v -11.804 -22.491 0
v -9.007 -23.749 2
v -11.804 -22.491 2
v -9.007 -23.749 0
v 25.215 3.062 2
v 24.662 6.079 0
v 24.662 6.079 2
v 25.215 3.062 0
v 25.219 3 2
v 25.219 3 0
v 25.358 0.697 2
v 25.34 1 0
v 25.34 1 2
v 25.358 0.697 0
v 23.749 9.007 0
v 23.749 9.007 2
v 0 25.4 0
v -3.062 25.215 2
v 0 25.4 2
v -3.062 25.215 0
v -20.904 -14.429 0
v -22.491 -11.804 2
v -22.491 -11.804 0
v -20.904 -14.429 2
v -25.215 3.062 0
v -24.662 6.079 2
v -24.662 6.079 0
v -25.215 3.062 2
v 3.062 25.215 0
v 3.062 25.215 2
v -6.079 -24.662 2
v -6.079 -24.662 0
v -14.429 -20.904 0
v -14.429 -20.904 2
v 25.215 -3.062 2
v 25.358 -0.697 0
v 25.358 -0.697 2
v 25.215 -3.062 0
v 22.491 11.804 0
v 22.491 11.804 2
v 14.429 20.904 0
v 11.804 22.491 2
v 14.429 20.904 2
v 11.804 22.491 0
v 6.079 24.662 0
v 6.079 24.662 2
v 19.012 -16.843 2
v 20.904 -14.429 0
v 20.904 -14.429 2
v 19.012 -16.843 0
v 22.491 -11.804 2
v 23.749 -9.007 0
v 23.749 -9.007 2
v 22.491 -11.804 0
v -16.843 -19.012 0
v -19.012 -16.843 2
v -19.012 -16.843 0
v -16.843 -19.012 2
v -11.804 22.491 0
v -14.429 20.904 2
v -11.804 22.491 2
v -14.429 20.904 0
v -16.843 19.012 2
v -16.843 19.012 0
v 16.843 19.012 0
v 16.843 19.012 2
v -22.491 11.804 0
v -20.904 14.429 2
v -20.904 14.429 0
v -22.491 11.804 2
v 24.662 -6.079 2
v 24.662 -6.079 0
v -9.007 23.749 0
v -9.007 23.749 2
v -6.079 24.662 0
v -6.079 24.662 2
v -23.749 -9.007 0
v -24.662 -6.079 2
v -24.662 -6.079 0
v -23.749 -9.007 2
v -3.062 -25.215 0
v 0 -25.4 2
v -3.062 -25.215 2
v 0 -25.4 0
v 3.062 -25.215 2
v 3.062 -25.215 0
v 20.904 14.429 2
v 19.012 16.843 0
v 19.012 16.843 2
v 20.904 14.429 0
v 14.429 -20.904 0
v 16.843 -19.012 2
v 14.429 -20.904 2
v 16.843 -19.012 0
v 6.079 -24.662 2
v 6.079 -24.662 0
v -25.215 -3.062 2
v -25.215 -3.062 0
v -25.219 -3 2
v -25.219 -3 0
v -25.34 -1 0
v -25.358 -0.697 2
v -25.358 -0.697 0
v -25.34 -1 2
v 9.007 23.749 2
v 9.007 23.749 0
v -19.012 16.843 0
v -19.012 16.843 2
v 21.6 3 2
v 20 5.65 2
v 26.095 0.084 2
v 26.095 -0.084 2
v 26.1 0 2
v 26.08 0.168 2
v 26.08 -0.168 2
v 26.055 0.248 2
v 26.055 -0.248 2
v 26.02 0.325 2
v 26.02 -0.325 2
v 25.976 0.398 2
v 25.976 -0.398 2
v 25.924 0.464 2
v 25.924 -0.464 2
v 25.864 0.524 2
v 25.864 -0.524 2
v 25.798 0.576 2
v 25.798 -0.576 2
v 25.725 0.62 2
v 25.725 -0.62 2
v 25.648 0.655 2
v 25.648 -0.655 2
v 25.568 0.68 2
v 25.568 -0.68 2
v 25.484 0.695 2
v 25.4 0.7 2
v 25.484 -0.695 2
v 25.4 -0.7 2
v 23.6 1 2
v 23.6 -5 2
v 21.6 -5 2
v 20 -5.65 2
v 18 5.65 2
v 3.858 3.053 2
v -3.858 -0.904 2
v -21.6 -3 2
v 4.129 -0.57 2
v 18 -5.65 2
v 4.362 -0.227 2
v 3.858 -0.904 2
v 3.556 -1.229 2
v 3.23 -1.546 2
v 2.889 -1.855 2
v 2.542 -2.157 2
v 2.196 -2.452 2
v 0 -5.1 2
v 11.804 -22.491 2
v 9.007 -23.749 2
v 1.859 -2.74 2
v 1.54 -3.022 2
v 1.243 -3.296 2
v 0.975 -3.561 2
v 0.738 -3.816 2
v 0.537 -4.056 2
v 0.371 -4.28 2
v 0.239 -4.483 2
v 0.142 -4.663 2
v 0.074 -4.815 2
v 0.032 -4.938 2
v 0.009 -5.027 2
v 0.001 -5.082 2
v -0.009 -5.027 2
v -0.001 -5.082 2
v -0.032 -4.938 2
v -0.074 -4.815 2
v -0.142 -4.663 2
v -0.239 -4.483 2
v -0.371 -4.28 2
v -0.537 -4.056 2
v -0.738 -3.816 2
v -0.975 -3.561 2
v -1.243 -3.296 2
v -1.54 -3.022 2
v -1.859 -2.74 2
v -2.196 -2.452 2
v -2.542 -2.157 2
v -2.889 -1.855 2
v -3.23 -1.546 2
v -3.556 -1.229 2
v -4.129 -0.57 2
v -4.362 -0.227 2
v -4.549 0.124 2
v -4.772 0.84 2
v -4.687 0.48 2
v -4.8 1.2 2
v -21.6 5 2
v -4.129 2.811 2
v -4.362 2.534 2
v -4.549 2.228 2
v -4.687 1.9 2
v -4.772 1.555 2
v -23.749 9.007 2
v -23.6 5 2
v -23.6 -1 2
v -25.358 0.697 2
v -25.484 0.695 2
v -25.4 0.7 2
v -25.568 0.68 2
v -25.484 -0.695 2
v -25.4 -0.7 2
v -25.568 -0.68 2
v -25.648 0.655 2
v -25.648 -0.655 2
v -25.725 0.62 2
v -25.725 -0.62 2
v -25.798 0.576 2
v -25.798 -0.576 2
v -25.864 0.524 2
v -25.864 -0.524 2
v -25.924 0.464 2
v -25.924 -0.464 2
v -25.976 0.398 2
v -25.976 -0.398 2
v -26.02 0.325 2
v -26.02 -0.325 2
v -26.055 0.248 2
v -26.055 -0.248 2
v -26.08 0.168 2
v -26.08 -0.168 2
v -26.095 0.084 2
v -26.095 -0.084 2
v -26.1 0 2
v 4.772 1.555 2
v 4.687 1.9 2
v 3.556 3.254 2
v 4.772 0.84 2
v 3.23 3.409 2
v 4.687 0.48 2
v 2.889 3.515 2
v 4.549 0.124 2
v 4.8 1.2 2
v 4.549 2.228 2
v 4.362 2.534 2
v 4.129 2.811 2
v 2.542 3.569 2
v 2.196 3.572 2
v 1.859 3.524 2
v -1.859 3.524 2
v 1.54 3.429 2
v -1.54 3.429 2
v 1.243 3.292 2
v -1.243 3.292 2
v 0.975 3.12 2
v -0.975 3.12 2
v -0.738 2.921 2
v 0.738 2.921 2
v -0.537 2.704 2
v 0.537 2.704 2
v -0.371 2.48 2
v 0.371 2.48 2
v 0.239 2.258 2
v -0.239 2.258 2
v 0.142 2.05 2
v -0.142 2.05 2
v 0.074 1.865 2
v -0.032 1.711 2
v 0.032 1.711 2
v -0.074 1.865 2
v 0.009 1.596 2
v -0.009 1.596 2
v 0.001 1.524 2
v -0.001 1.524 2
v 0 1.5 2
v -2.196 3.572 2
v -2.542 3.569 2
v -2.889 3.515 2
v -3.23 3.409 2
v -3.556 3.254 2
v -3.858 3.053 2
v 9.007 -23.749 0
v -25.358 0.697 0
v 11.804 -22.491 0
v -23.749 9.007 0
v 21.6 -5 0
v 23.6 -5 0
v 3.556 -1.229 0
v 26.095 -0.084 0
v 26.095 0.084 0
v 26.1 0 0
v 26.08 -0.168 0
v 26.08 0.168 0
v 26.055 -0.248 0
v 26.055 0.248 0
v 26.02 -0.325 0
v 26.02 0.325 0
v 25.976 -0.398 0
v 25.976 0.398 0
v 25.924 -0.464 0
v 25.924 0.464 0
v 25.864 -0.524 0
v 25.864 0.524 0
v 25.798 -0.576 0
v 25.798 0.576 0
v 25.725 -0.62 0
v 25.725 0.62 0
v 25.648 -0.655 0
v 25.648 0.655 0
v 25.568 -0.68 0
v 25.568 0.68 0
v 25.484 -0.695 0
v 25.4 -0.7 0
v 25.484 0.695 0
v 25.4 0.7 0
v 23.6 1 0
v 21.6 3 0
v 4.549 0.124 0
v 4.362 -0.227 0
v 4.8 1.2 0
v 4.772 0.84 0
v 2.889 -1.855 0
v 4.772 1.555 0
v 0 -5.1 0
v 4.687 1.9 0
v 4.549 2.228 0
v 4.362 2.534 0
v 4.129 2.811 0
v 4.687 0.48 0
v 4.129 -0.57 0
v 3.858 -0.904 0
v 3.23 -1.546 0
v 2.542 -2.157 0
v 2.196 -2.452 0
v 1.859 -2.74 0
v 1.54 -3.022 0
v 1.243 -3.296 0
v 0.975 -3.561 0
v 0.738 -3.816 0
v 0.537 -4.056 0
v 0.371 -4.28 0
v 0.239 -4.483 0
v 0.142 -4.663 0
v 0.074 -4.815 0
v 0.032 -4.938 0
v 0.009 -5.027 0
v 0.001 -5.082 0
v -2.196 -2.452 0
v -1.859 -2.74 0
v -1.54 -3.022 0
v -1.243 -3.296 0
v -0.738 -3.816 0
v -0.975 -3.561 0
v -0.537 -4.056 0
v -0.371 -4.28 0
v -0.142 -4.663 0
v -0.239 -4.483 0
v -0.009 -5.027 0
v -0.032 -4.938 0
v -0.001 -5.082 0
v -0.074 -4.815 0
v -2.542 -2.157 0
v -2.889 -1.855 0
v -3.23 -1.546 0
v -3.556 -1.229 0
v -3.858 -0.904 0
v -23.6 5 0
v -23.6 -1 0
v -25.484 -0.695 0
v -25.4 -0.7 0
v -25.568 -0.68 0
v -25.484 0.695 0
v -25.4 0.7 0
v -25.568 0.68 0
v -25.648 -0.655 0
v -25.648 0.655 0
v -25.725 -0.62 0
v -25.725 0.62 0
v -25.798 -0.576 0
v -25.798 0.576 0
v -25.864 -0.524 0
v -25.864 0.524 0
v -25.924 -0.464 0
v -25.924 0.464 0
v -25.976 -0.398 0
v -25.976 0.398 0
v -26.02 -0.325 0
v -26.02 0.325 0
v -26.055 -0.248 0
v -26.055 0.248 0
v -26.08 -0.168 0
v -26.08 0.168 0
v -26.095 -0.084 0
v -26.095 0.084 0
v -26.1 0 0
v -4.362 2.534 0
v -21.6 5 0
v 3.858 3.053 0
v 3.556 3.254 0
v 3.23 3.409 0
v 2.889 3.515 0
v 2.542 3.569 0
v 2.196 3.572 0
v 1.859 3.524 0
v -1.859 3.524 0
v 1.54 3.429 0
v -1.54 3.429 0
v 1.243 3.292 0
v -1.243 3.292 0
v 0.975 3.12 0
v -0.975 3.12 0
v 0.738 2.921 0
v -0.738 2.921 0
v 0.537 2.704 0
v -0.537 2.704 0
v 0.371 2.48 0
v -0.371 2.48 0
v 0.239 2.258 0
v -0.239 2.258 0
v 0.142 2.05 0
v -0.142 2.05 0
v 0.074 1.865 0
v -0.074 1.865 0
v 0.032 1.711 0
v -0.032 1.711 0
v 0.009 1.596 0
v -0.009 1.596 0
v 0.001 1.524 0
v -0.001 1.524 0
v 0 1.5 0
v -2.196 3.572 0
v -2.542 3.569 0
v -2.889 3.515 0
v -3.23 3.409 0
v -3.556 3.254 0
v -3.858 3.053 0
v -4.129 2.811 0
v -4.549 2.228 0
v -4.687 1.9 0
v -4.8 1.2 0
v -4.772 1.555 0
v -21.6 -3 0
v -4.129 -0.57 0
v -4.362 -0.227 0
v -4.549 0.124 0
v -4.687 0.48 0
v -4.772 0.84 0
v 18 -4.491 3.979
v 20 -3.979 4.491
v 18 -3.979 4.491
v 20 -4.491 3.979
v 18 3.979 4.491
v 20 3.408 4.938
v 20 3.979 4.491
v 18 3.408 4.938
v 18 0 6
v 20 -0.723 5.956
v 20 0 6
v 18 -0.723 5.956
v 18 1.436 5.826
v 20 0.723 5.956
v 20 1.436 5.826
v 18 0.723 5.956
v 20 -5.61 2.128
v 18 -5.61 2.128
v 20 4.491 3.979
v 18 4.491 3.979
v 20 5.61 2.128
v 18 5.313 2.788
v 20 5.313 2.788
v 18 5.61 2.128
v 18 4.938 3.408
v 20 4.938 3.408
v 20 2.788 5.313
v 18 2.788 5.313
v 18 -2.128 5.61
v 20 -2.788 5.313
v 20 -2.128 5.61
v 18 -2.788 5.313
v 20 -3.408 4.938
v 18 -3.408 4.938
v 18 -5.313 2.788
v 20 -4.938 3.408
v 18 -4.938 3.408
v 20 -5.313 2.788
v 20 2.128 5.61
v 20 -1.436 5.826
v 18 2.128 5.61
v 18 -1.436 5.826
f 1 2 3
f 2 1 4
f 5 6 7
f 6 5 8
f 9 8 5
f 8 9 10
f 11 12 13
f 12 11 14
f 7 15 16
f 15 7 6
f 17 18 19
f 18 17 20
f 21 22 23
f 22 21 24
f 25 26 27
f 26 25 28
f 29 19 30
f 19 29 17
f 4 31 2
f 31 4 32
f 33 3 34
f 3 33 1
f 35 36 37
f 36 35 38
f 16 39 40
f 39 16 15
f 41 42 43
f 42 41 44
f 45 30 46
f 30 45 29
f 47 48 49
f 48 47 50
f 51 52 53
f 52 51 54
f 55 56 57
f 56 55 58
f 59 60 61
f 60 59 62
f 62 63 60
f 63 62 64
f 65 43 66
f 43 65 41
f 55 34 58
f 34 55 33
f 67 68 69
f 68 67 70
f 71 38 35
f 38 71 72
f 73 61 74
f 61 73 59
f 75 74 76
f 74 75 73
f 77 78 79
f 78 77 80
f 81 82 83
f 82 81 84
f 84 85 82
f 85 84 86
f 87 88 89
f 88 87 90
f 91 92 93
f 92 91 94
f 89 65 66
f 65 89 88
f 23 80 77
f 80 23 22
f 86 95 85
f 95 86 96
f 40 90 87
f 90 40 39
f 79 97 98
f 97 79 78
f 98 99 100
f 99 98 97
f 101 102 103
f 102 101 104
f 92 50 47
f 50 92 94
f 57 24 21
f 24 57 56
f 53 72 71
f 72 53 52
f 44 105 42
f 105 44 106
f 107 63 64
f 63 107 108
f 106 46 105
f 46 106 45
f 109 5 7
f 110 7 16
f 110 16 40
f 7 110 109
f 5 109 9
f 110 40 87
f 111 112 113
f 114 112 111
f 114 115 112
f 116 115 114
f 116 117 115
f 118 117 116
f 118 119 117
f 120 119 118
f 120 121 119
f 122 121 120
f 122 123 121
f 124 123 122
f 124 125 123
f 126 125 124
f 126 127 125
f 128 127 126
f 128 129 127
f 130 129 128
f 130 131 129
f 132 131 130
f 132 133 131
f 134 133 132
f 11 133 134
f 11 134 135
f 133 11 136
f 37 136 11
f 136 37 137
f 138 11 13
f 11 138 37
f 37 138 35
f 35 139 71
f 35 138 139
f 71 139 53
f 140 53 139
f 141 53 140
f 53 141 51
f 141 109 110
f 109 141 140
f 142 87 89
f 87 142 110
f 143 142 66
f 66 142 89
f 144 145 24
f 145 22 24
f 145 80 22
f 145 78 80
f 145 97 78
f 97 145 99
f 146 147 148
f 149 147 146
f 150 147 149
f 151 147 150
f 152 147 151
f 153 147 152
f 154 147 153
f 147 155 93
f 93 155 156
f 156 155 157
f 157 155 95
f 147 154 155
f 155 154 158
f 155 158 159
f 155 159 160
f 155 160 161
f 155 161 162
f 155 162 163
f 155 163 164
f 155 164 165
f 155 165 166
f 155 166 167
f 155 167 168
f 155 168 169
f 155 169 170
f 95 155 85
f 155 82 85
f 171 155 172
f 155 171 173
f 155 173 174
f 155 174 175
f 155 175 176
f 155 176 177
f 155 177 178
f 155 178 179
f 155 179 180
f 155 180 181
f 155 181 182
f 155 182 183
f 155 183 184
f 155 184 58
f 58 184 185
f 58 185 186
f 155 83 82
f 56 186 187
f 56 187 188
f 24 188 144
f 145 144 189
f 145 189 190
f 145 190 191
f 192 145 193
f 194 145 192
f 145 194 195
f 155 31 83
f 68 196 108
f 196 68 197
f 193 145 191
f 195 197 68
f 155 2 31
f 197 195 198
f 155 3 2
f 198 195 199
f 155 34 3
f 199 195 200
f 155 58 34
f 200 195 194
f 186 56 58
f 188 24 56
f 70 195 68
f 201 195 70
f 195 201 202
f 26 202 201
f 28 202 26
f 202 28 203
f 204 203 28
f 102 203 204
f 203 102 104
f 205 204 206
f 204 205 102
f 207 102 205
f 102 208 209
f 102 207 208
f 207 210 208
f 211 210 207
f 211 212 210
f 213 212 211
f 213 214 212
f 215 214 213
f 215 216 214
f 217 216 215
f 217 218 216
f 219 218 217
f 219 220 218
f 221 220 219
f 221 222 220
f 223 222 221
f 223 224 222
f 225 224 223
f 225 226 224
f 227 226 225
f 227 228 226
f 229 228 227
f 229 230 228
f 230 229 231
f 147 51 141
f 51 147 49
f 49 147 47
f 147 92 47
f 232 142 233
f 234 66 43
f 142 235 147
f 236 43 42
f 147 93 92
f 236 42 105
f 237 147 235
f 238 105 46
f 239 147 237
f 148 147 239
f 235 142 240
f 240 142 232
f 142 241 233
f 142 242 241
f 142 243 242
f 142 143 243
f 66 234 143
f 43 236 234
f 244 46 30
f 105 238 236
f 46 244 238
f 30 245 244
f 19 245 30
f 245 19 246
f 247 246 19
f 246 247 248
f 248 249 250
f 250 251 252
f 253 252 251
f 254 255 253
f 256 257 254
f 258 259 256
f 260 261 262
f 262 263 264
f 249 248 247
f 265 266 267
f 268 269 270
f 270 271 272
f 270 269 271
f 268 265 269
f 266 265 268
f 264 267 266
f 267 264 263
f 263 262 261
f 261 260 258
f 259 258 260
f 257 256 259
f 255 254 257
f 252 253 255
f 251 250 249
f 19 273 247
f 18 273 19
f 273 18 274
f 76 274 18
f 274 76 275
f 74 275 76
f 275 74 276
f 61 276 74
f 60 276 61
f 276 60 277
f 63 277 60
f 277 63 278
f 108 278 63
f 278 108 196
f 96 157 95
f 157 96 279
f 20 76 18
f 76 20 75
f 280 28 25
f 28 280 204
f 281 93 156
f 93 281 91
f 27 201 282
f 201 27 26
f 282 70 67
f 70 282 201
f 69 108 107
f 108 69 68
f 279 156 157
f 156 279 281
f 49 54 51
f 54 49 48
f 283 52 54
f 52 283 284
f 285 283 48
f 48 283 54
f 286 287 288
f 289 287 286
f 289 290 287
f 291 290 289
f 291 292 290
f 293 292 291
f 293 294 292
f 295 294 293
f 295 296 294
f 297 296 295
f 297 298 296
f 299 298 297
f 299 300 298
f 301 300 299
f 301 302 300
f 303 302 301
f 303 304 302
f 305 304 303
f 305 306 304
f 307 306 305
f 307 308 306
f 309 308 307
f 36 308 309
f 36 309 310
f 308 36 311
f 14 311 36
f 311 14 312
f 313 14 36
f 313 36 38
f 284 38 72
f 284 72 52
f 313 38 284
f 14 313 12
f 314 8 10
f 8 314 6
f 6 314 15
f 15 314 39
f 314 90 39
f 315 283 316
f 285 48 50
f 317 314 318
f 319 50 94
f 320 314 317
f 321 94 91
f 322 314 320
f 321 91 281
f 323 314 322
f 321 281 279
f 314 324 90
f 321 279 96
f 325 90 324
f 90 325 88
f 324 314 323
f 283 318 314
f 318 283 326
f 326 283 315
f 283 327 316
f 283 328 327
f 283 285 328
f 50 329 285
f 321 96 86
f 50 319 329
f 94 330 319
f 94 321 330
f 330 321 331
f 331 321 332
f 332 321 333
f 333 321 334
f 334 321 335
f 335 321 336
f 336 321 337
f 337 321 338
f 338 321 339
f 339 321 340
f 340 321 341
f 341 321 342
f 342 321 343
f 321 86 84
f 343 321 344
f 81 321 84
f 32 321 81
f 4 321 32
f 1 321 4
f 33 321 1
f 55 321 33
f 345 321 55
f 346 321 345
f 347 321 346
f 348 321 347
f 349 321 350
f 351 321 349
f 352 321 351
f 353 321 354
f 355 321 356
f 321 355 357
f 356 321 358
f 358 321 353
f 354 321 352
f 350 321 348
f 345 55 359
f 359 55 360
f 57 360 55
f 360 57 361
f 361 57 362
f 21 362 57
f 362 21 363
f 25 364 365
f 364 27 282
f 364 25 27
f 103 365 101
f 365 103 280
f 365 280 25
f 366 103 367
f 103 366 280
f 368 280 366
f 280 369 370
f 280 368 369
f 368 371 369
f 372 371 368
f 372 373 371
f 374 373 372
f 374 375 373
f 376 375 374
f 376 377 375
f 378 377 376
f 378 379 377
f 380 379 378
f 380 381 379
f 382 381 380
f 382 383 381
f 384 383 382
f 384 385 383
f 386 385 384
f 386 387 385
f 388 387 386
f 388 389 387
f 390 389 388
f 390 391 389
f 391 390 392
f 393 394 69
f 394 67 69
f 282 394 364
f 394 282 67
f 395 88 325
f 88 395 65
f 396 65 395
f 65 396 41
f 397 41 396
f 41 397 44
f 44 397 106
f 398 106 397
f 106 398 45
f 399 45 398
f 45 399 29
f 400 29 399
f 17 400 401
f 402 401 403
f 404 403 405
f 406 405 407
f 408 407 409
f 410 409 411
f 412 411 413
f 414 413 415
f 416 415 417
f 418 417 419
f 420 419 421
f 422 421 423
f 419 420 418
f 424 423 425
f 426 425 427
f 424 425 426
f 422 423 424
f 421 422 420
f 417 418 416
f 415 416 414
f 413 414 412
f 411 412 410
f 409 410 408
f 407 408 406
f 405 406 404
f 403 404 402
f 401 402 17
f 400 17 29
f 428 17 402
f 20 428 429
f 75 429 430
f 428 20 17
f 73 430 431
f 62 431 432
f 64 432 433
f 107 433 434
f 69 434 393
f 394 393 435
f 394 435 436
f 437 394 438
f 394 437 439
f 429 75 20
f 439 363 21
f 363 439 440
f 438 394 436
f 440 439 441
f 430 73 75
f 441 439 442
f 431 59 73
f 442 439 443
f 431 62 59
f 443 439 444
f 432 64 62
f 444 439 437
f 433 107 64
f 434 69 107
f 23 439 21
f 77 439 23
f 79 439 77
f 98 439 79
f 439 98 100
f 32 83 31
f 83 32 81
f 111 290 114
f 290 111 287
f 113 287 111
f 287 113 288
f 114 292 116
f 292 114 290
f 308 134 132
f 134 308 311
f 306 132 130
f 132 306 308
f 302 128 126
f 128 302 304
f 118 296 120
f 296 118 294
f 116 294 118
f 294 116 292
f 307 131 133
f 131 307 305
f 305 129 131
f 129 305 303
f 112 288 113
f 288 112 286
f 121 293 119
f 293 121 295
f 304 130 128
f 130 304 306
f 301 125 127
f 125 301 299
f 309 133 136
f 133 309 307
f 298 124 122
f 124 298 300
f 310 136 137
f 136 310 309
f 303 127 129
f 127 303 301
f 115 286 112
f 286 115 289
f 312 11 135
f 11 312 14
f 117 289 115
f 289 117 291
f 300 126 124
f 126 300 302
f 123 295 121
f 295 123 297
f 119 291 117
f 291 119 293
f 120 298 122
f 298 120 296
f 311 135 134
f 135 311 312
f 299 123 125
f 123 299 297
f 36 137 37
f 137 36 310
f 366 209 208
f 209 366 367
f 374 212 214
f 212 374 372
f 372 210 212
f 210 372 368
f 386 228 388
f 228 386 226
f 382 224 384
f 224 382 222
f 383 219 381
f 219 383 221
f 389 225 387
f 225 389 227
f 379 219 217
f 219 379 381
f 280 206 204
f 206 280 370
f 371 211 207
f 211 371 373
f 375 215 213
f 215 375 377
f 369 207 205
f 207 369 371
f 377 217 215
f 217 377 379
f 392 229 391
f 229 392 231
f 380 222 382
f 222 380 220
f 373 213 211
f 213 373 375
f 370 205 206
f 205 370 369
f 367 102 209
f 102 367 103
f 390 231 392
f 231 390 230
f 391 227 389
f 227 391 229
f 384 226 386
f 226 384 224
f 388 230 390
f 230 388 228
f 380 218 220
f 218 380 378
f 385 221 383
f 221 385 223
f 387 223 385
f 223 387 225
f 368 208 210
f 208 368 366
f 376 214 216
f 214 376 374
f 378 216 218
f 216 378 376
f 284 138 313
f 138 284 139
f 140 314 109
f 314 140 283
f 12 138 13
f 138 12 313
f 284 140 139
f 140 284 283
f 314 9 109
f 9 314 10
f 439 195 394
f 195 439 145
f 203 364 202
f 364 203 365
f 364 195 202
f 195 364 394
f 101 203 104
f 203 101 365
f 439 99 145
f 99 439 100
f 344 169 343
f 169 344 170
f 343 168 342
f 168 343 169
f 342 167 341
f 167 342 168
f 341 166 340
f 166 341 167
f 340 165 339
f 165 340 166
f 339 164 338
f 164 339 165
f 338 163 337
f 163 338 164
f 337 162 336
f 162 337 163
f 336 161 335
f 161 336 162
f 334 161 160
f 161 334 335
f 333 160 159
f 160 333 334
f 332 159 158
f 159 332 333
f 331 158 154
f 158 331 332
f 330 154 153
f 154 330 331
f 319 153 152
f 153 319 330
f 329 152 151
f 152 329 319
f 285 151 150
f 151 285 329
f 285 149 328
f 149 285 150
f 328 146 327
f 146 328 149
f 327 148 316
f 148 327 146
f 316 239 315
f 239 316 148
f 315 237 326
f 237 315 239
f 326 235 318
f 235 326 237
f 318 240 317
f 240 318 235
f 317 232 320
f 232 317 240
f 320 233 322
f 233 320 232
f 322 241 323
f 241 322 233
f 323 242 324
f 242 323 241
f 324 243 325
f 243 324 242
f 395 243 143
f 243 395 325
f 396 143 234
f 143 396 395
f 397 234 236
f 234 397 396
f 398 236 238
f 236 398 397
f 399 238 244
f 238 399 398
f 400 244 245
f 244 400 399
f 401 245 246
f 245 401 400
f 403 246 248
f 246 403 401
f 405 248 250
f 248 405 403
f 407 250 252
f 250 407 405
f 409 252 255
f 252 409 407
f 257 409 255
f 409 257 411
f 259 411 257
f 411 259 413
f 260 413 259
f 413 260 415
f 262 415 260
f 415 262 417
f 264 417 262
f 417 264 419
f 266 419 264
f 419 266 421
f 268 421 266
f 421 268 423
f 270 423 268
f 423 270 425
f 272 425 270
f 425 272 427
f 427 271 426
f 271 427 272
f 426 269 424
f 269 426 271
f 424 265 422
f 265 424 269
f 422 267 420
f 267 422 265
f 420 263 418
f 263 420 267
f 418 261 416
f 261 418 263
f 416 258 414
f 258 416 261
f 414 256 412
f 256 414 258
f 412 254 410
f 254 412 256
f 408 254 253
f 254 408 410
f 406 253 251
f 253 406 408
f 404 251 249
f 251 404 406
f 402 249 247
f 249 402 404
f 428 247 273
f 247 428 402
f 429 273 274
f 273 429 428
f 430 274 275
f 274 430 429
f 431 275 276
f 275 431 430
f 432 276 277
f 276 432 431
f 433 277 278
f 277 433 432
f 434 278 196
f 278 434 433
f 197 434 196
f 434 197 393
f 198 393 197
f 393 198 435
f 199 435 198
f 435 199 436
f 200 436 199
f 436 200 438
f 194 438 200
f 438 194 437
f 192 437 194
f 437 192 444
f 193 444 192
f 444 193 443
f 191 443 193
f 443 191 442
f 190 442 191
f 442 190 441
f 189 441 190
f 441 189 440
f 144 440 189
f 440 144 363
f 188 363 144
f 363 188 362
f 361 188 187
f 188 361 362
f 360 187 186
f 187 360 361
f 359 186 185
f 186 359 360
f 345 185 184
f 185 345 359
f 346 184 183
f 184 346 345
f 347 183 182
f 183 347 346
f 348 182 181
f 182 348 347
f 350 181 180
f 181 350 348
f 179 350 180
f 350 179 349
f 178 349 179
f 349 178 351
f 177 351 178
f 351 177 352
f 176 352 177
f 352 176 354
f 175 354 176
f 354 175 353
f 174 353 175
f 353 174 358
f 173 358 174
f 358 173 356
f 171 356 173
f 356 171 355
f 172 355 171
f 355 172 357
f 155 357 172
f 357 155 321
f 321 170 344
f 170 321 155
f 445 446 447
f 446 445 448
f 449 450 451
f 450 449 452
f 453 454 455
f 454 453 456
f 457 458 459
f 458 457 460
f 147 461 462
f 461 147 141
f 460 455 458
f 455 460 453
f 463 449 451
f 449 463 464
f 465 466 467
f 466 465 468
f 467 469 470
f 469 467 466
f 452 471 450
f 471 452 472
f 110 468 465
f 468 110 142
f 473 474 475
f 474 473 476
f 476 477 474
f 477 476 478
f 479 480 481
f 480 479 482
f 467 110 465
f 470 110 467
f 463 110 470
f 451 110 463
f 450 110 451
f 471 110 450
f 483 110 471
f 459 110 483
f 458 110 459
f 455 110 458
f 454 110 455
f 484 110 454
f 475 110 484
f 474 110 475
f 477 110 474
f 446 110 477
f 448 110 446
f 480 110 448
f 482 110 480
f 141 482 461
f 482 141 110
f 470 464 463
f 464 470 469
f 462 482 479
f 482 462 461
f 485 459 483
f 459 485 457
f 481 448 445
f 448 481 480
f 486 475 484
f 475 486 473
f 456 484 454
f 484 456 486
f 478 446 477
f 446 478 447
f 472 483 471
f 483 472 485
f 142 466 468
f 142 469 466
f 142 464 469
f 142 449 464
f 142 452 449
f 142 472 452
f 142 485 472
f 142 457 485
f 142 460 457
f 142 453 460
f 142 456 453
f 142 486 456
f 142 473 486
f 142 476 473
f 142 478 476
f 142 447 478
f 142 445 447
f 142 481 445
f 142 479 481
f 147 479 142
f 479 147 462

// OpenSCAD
// file: csodaszarvas.scad
module csodaszarvas() {
    scale([0.001, 0.001])
    translate([-300, -475])
    polygon([
        [ 606, 191.3 ],
        [ 607.2, 215.2 ],
        [ 607.4, 221.1 ],
        [ 607.1, 231.2 ],
        [ 606, 239.1 ],
        [ 603.8, 245.1 ],
        [ 602.3, 247.6 ],
        [ 600, 251.1 ],
        [ 596.8, 257.2 ],
        [ 596.4, 259.1 ],
        [ 596.9, 259.5 ],
        [ 601.1, 259 ],
        [ 613.4, 255.6 ],
        [ 636.3, 247.4 ],
        [ 660.1, 237.7 ],
        [ 670, 232.9 ],
        [ 678.3, 228.4 ],
        [ 697.9, 216.3 ],
        [ 706.8, 210.2 ],
        [ 714.5, 204.8 ],
        [ 726.6, 197.4 ],
        [ 729.3, 196.3 ],
        [ 729.9, 196.4 ],
        [ 730.5, 197.1 ],
        [ 730.3, 199.4 ],
        [ 726.3, 207.6 ],
        [ 715.6, 223.1 ],
        [ 701.7, 239.5 ],
        [ 694.5, 246.6 ],
        [ 689.9, 250.6 ],
        [ 679.4, 258.5 ],
        [ 667.4, 266.1 ],
        [ 654.1, 273.4 ],
        [ 639.6, 280.4 ],
        [ 623.9, 287 ],
        [ 598.7, 296.1 ],
        [ 562.4, 306.6 ],
        [ 524.1, 314.9 ],
        [ 484.7, 320.7 ],
        [ 455, 323.2 ],
        [ 435.5, 324 ],
        [ 425.8, 324.1 ],
        [ 416, 324 ],
        [ 395.4, 322.9 ],
        [ 374, 320.8 ],
        [ 352.2, 317.7 ],
        [ 330.5, 313.8 ],
        [ 309, 309 ],
        [ 288.4, 303.5 ],
        [ 268.9, 297.4 ],
        [ 259.7, 294.1 ],
        [ 258.7, 293.9 ],
        [ 258.3, 295.1 ],
        [ 261.5, 300.6 ],
        [ 266, 306.1 ],
        [ 270.9, 311.9 ],
        [ 277.6, 320.9 ],
        [ 278.6, 322.9 ],
        [ 278.1, 323.3 ],
        [ 274.8, 323.9 ],
        [ 265, 323.8 ],
        [ 256.3, 323.1 ],
        [ 234, 321 ],
        [ 209.8, 352 ],
        [ 201, 363.5 ],
        [ 191.8, 376.7 ],
        [ 188.2, 383.1 ],
        [ 186.5, 387.8 ],
        [ 186.7, 391 ],
        [ 188.7, 392.9 ],
        [ 192.4, 393.8 ],
        [ 194.9, 393.9 ],
        [ 203.2, 394.6 ],
        [ 230.6, 399.2 ],
        [ 265.2, 406.7 ],
        [ 298.5, 415.3 ],
        [ 312, 419.4 ],
        [ 330, 425.6 ],
        [ 387.5, 447.1 ],
        [ 420, 459.6 ],
        [ 453.1, 472.2 ],
        [ 514.3, 494.1 ],
        [ 535, 500.7 ],
        [ 548.7, 504.8 ],
        [ 562.8, 510.1 ],
        [ 568, 513.2 ],
        [ 569.7, 515.6 ],
        [ 569.9, 517.1 ],
        [ 568.7, 519.6 ],
        [ 564.6, 523.3 ],
        [ 557.6, 527.5 ],
        [ 553.1, 529.9 ],
        [ 537.9, 537.6 ],
        [ 564.6, 567.5 ],
        [ 573.4, 577.4 ],
        [ 589.8, 596.7 ],
        [ 621.9, 637.5 ],
        [ 656.4, 682.6 ],
        [ 665.2, 694.8 ],
        [ 682.8, 722.1 ],
        [ 699.8, 752 ],
        [ 715.4, 783.1 ],
        [ 729, 813.8 ],
        [ 739.8, 842.4 ],
        [ 747.3, 867.5 ],
        [ 750.2, 883 ],
        [ 750.7, 891.5 ],
        [ 750.5, 895.1 ],
        [ 749.2, 907.4 ],
        [ 743.6, 895.7 ],
        [ 739.7, 888 ],
        [ 729.2, 869.1 ],
        [ 708.5, 834.7 ],
        [ 676.1, 784.3 ],
        [ 644.4, 738.8 ],
        [ 631.1, 721.2 ],
        [ 620.8, 709 ],
        [ 595.5, 682.1 ],
        [ 566.8, 654.9 ],
        [ 538.7, 630.9 ],
        [ 525.9, 621.3 ],
        [ 517.2, 615.2 ],
        [ 499.5, 603.6 ],
        [ 481.4, 592.7 ],
        [ 463.1, 582.6 ],
        [ 444.4, 573.3 ],
        [ 425.4, 564.7 ],
        [ 406.1, 557 ],
        [ 386.5, 550 ],
        [ 366.6, 543.7 ],
        [ 346.4, 538.3 ],
        [ 325.9, 533.6 ],
        [ 305.1, 529.7 ],
        [ 284, 526.6 ],
        [ 262.6, 524.2 ],
        [ 240.9, 522.7 ],
        [ 219, 521.9 ],
        [ 207.9, 521.8 ],
        [ 186.9, 522 ],
        [ 149.8, 523.2 ],
        [ 121.8, 525.3 ],
        [ 108.8, 527.3 ],
        [ 104.7, 528.9 ],
        [ 104.2, 529.7 ],
        [ 105.5, 530.7 ],
        [ 115, 534.8 ],
        [ 142.6, 545 ],
        [ 167, 553.3 ],
        [ 192.9, 562.3 ],
        [ 227.5, 575.7 ],
        [ 244, 583 ],
        [ 249.1, 585.7 ],
        [ 252.7, 588 ],
        [ 260.2, 593.8 ],
        [ 271.4, 604.2 ],
        [ 281, 615.1 ],
        [ 285.9, 621.8 ],
        [ 288.9, 627.4 ],
        [ 289.8, 630.6 ],
        [ 289.6, 632.1 ],
        [ 289.2, 632.6 ],
        [ 288, 632.8 ],
        [ 281.5, 631.3 ],
        [ 262.8, 625.3 ],
        [ 202.8, 603.2 ],
        [ 105.8, 564.9 ],
        [ 47, 540 ],
        [ 29.3, 531.6 ],
        [ 23.6, 528.3 ],
        [ 22.8, 527.3 ],
        [ 23.1, 524.9 ],
        [ 24.9, 519.9 ],
        [ 28.4, 514.7 ],
        [ 33.4, 509.6 ],
        [ 39.7, 504.6 ],
        [ 47.2, 499.9 ],
        [ 55.7, 495.7 ],
        [ 65, 491.9 ],
        [ 69.9, 490.3 ],
        [ 78.5, 487.7 ],
        [ 89.4, 483.8 ],
        [ 93, 481.5 ],
        [ 93.6, 480 ],
        [ 92.3, 477.3 ],
        [ 90.3, 474.9 ],
        [ 88.5, 472.6 ],
        [ 86, 466.8 ],
        [ 85, 458 ],
        [ 85.3, 444.3 ],
        [ 85.8, 435 ],
        [ 86.4, 427.5 ],
        [ 88.3, 413.5 ],
        [ 91.3, 400.8 ],
        [ 95.4, 389.1 ],
        [ 100.9, 378.4 ],
        [ 107.6, 368.2 ],
        [ 115.9, 358.6 ],
        [ 125.7, 349.1 ],
        [ 131.3, 344.5 ],
        [ 139.6, 337.4 ],
        [ 149, 328.2 ],
        [ 152.2, 324.1 ],
        [ 152.6, 322.9 ],
        [ 152.2, 322 ],
        [ 149, 319.4 ],
        [ 139.6, 314.7 ],
        [ 131.4, 311.5 ],
        [ 122.6, 308.3 ],
        [ 109.3, 301.9 ],
        [ 102.5, 296.9 ],
        [ 99.5, 293.4 ],
        [ 97.5, 289.7 ],
        [ 96.6, 285.7 ],
        [ 96.5, 283.6 ],
        [ 96.6, 280.8 ],
        [ 97.4, 275.9 ],
        [ 99.3, 271.6 ],
        [ 102.3, 268.1 ],
        [ 106.6, 265.1 ],
        [ 112.2, 262.6 ],
        [ 123.6, 259.4 ],
        [ 133.3, 257.7 ],
        [ 140.1, 256.8 ],
        [ 154.5, 255.5 ],
        [ 169.9, 255.1 ],
        [ 186.4, 255.5 ],
        [ 213.5, 257.7 ],
        [ 254.2, 263.7 ],
        [ 276.7, 268 ],
        [ 294.7, 271.6 ],
        [ 326.2, 276.7 ],
        [ 352.1, 279.1 ],
        [ 368.7, 278.8 ],
        [ 378.7, 277.7 ],
        [ 387.9, 275.7 ],
        [ 396.5, 272.8 ],
        [ 404.7, 269.1 ],
        [ 412.5, 264.4 ],
        [ 424, 255.5 ],
        [ 439.6, 240.2 ],
        [ 447.8, 231 ],
        [ 458.2, 219.3 ],
        [ 470.9, 206.9 ],
        [ 475.1, 203.9 ],
        [ 476.7, 203.3 ],
        [ 477.2, 203.4 ],
        [ 477.6, 204.5 ],
        [ 477.2, 208.9 ],
        [ 474.1, 219.7 ],
        [ 470.6, 228.5 ],
        [ 467.1, 237.1 ],
        [ 464.1, 246.8 ],
        [ 463.9, 250.1 ],
        [ 464.4, 250.5 ],
        [ 468.8, 248.5 ],
        [ 490.7, 235.2 ],
        [ 505.6, 225.4 ],
        [ 520.4, 215.9 ],
        [ 538.2, 205.6 ],
        [ 545.1, 202.5 ],
        [ 546.5, 202.4 ],
        [ 547, 203.2 ],
        [ 546.5, 206.4 ],
        [ 542.8, 214.3 ],
        [ 538.7, 220.8 ],
        [ 534.4, 226.8 ],
        [ 524.7, 238.4 ],
        [ 513.8, 249.6 ],
        [ 502, 260 ],
        [ 489.4, 269.6 ],
        [ 476.5, 278 ],
        [ 463.3, 285.2 ],
        [ 450.2, 290.9 ],
        [ 443.8, 293.2 ],
        [ 440.9, 294.2 ],
        [ 436.4, 296.2 ],
        [ 433.9, 298.2 ],
        [ 433.2, 300.1 ],
        [ 434.3, 301.7 ],
        [ 437.1, 303.1 ],
        [ 444.4, 304.4 ],
        [ 451.3, 304.7 ],
        [ 455.7, 304.6 ],
        [ 464.6, 303.7 ],
        [ 473.8, 302 ],
        [ 483.2, 299.4 ],
        [ 497.5, 294 ],
        [ 516.7, 284.1 ],
        [ 535.6, 271.5 ],
        [ 553.8, 256.5 ],
        [ 571, 239.4 ],
        [ 586.5, 220.4 ],
        [ 593.6, 210.3 ],
        [ 606, 191.3 ],
    ]);
}
// file: liliom.scad
module liliom() {
    half_liliom();
    
    scale([-1, 1, 1])
    half_liliom();
}

module half_liliom() {
    polygon([
        [0, 7.46712779998779296],
        [0.26967287063598632, 7.20044994354248048],
        [0.94814229011535648, 6.58845710754394528],
        [1.42200708389282224, 6.17919015884399414],
        [1.79066205024719232, 5.74145984649658208],
        [2.05747461318969727, 5.2704448699951172],
        [2.22582006454467772, 4.7613449096679688],
        [2.25797224044799804, 4.29102039337158204],
        [2.24035477638244628, 3.88594508171081536],
        [2.15555977821350098, 3.5056800842285156],
        [1.96279478073120112, 2.96955728530883792],
        [1.8151874542236328, 2.5590219497680664],
        [1.63731694221496584, 2.1110994815826416],
        [1.64005494117736816, 2.07384753227233887],
        [1.60886192321777344, 2.03658699989318847],
        [2.06402993202209473, 2.5094547271728516],
        [2.33883690834045412, 2.6842195987701416],
        [2.49488210678100584, 2.78345203399658208],
        [2.88944220542907712, 2.926724910736084],
        [3.348757266998291, 3.00064516067504882],
        [3.85778975486755376, 3.00032973289489746],
        [4.32345008850097656, 2.90605473518371584],
        [4.736684799194336, 2.72069191932678224],
        [5.08839702606201172, 2.4471144676208496],
        [5.42768955230712888, 1.98296999931335456],
        [5.62108469009399416, 1.42498469352722168],
        [5.66368484497070312, 0.7977819442749024],
        [5.55058479309082032, 0.125993013381958],
        [5.3981022834777832, -0.28215837478637696],
        [5.17607975006103516, -0.66973829269409176],
        [4.88572454452514656, -1.03499937057495117],
        [4.52822256088256832, -1.37619709968566896],
        [4.18364953994750976, -1.64024949073791504],
        [4.12513446807861328, -1.47218942642211912],
        [3.90827965736389168, -0.98570251464843744],
        [3.63095211982727048, -0.63016390800476072],
        [3.51667499542236328, -0.55561423301696776],
        [3.30768728256225584, -0.41928577423095704],
        [2.95302700996398928, -0.36678242683410648],
        [2.60279989242553712, -0.44676804542541504],
        [2.29619979858398436, -0.62453413009643552],
        [2.03015255928039551, -0.90253472328186032],
        [1.80157470703124992, -1.28321242332458496],
        [1.56615757942199704, -1.98507714271545408],
        [1.5184500217437744, -2.70791244506835936],
        [1.59113216400146488, -3.18418478965759276],
        [1.61213207244873048, -3.32175707817077636],
        [1.81120491027832032, -3.83767461776733392],
        [2.0208899974822998, -4.14763498306274414],
        [2.24720191955566408, -4.30518007278442384],
        [2.48521471023559568, -4.3085927963256836],
        [2.72999954223632816, -4.15616989135742188],
        [2.9002046585083008, -3.95276212692260736],
        [2.98508977890014656, -3.85031247138977056],
        [3.13331222534179688, -4.63688182830810544],
        [3.12866950035095214, -5.05943202972412109],
        [3.02335453033447265, -5.39909219741821288],
        [2.85991501808166496, -5.6051025390625],
        [2.64689970016479496, -5.76804733276367184],
        [2.40512251853942872, -5.86350727081298832],
        [2.15416502952575684, -5.88974952697753904],
        [1.86949467658996576, -5.84953451156616208],
        [1.47239971160888672, -5.63355731964111328],
        [1.10447216033935546, -5.27276992797851564],
        [1.07521462440490723, -5.23593711853027344],
        [1.08969712257385254, -5.32505226135253908],
        [1.06133937835693359, -5.80823993682861328],
        [0.86234951019287104, -6.37065792083740232],
        [0.59541177749633792, -6.817814826965332],
        [0.2096571922302246, -7.2916574478149414],
        [0, -7.46712779998779296],
    ]);
}
// file: heart.scad
module heart(h=1, n=100) {
    step = 360/n;
    points = [ for (t=[0:step:359.999]) [16*pow(sin(t),3), 13*cos(t) - 5*cos(2*t) - 2*cos(3*t) - cos(4*t)]];
    linear_extrude(height=h)
        polygon(points);
}
// main file
use <heart.scad>
use <liliom.scad>
use <csodaszarvas.scad>

filter_diameter = 52;
reduction_factor = 2;
generate_handle = true;
handle_radius = 6;
thickness = 2;


filter_cut(filter_diameter/2,reduction_factor);


module filter_cut(radius, reduction_factor)
{
    $fn=filter_diameter;
    difference(){
        filter(radius-0.6);
        
        translate([radius-3.4,-2,0])
        cube([2,6,10], center=true);
        
        translate([radius-0.9,2,0])
        cube([7,2,10], center=true);
        
        translate([-(radius-3.4),2,0])
        cube([2,6,10], center=true);
        
        translate([-(radius-0.9),-2,0])
        cube([7,2,10], center=true);
        
        //linear_extrude(thickness, convexity=4)
        //scale([2, 2, 1])
        //liliom();
        
//        linear_extrude(thickness, convexity=4)
//        scale([30, 30, 1])
//        csodaszarvas();

        scale([0.3, 0.3, 1])
        heart(5);
    }
    
    if (generate_handle) 
    {
        translate([radius-8, 0, 0])
        handle(handle_radius);    
    }
}

module handle(handle_radius)
{
    rotate([0,90,0])
    difference() {
        cylinder(r=handle_radius, h=2);
        
        translate([0,-handle_radius,0])
        cube([handle_radius,2*handle_radius,2]);
    }
}

module filter(radius_transformed) 
{
    cylinder(r=radius_transformed,h=2);
    
    translate([radius_transformed,0,0])
    cylinder(r=0.7,h=2);
    
    translate([-radius_transformed,0,0])
    cylinder(r=0.7,h=2);
}
